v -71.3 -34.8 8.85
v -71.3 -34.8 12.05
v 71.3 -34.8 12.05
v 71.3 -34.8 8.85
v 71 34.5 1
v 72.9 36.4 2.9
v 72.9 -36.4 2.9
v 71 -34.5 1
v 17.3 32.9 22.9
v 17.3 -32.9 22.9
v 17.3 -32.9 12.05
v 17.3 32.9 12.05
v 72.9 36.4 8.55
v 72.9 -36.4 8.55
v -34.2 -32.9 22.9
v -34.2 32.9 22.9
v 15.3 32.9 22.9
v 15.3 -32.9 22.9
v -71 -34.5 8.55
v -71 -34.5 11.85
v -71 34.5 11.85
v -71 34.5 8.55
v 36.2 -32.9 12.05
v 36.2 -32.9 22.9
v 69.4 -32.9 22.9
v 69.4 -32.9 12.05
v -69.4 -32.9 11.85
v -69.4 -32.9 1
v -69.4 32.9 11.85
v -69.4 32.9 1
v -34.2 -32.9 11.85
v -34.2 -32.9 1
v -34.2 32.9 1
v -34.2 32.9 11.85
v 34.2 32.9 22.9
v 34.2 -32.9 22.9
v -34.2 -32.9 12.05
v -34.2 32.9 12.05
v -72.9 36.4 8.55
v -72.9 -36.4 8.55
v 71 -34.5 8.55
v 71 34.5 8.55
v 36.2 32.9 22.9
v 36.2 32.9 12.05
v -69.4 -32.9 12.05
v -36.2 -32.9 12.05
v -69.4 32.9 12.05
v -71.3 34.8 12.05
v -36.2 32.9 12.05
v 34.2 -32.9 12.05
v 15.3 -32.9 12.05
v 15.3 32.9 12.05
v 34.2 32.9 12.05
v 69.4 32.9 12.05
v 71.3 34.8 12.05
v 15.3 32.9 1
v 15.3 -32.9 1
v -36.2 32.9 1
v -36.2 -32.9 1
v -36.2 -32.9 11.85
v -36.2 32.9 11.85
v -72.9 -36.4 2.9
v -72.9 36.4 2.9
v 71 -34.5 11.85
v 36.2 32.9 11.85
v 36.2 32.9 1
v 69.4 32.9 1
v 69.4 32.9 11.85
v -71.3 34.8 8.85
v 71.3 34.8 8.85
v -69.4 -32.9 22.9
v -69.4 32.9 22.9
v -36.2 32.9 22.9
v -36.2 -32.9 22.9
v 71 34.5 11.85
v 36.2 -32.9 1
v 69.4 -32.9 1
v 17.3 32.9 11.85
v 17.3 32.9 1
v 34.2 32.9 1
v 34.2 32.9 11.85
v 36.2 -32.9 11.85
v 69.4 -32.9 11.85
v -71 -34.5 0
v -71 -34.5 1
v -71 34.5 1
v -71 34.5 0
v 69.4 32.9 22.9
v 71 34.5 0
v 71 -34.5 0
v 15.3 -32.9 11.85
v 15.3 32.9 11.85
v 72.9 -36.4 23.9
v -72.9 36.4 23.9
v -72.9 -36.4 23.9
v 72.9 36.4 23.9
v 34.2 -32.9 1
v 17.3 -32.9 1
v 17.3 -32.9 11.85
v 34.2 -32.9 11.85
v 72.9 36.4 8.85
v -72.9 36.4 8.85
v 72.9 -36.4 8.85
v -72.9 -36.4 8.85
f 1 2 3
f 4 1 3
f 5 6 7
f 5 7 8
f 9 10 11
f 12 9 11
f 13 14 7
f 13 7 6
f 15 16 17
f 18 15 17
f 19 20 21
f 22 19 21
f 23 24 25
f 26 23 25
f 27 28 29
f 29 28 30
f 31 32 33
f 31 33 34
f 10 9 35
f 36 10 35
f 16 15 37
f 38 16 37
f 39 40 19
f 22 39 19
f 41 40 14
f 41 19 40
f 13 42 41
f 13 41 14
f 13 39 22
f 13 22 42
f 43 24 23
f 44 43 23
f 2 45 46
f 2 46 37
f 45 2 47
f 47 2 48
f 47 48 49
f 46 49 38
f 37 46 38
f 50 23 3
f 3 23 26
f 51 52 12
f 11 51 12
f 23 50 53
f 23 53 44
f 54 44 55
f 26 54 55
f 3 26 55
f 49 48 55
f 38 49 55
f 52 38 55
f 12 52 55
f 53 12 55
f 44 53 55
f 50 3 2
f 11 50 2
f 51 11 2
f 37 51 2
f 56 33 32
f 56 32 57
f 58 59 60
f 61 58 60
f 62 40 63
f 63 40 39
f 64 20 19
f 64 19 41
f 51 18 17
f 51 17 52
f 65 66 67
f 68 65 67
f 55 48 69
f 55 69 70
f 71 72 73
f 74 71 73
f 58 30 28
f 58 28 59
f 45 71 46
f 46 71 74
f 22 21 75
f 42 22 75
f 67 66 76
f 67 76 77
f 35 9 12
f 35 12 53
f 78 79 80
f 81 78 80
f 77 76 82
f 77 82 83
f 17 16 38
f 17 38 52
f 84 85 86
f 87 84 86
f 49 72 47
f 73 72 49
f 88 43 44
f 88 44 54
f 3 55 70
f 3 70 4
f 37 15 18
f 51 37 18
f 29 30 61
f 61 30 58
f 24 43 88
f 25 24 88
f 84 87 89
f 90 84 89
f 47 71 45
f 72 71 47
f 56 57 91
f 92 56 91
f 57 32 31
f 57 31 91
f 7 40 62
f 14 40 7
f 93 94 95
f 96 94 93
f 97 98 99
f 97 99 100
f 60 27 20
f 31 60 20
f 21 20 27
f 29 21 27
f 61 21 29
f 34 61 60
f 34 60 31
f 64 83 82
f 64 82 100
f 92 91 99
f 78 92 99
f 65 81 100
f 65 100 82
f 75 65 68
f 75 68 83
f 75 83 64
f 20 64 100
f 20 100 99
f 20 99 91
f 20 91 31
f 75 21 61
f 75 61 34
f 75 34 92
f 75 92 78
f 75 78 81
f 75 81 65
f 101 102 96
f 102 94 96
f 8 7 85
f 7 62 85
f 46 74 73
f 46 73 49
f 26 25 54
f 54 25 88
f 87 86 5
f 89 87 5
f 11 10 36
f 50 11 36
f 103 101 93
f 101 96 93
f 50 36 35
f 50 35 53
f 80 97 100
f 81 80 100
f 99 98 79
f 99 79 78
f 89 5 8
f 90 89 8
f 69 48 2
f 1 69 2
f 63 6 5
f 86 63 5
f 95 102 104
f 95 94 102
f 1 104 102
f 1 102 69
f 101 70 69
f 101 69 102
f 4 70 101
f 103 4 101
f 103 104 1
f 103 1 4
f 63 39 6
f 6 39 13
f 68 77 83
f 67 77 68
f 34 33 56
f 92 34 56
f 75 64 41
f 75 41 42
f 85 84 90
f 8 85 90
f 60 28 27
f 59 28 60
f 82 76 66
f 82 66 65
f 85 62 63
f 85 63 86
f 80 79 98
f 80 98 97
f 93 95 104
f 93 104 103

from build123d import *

# Parameters (mm, degrees)
F4_W          = 145.8
F4_H          = 72.8
F5_DEPTH      = 1
F6_W          = 145.8
F6_H          = 72.8
F6_W_2        = 138.8
F6_H_2        = 65.8
F7_DEPTH      = 10.85
F8_W          = 2
F8_H          = 10.85
F9_DEPTH      = 65.8
F12_W         = 145.8
F12_H         = 72.8
F12_W_2       = 142
F12_H_2       = 69
F13_DEPTH     = 3.3
F14_W         = 145.8
F14_H         = 72.8
F14_W_2       = 142
F14_H_2       = 69
F15_DEPTH     = 3
F16_T4_DEPTH  = 142
F16_T9_DEPTH  = 69
F16_T14_DEPTH = 142
F16_T19_DEPTH = 69
F16_T25_DEPTH = 147.1433659759
F16_T31_DEPTH = 74.1433659759
F16_T40_DEPTH = 147.1433659759
F16_T46_DEPTH = 74.1433659759
F16_T55_DEPTH = 147.1433659759
F16_T61_DEPTH = 74.1433659759
F16_T70_DEPTH = 74.1433659759
F16_T76_DEPTH = 147.1433659759
F17_W         = 145.8
F17_H         = 72.8
F17_W_2       = 142.6
F17_H_2       = 69.6
F18_DEPTH     = 3.2


# Not quite as in the source:
# - a fillet or chamfer that OpenCascade refuses, or shapes differently, is made with other operations: its cross-section is extruded or revolved along the edge and cut away or added


with BuildPart() as f5:
    # F4 (on Top) → F5 (new body)
    with BuildSketch(Plane.XY):
        Rectangle(F4_W, F4_H)
    extrude(amount=F5_DEPTH)

    # F6 (on face) → F7 (join)
    with BuildSketch(Plane.XY.offset(1)):
        Rectangle(F6_W, F6_H)
        Rectangle(F6_W_2, F6_H_2, mode=Mode.SUBTRACT)
    extrude(amount=F7_DEPTH)

    # F8 (on face) → F9 (join, through all)
    with BuildSketch(Plane.XZ.offset(-32.9)):
        with Locations((-35.2, 6.425)):
            Rectangle(F8_W, F8_H)
        with Locations((16.3, 6.425)):
            Rectangle(F8_W, F8_H)
        with Locations((35.2, 6.425)):
            Rectangle(F8_W, F8_H)
    extrude(amount=F9_DEPTH)


with BuildPart() as f11_1:
    # F11: instance of F5
    add(f5.part.mirror(Plane(origin=(1.1434328358, 0, 11.95), x_dir=(1, 0, 0), z_dir=(0, 0, 1))))

    # F17 (on face) → F18 (join)
    with BuildSketch(Plane(origin=(0, 0, 12.05), x_dir=(1, 0, 0), z_dir=(0, 0, -1))):
        Rectangle(F17_W, F17_H)
        Rectangle(F17_W_2, F17_H_2, mode=Mode.SUBTRACT)
    extrude(amount=F18_DEPTH)


with BuildPart() as f5_1:
    add(f5.part)

    # F12 (on face) → F13 (cut)
    with BuildSketch(Plane.XY.offset(11.85)):
        Rectangle(F12_W, F12_H)
        Rectangle(F12_W_2, F12_H_2, mode=Mode.SUBTRACT)
    extrude(amount=-F13_DEPTH, mode=Mode.SUBTRACT)

    # F14 (on face) → F15 (cut)
    with BuildSketch(Plane(origin=(0, 0, 0), x_dir=(1, 0, 0), z_dir=(0, 0, -1))):
        Rectangle(F14_W, F14_H)
        Rectangle(F14_W_2, F14_H_2, mode=Mode.SUBTRACT)
    extrude(amount=-F15_DEPTH, mode=Mode.SUBTRACT)

    # F16: chamfer of 2 on 4 edges, made by hand


with BuildPart() as f16_tool2:
    # F16_s3 → F16_t4 (new body)
    with BuildSketch(Plane.YZ.offset(-71)):
        Polygon((-36.5, 3), (-34.5, 1), (-34.5, 3), align=None)
    extrude(amount=F16_T4_DEPTH)

    split(bisect_by=Plane.XZ.offset(36.4), keep=Keep.BOTTOM)


with BuildPart() as f5_2:
    add(f5_1.part)

    # F16_t1: union F16_tool2
    add(f16_tool2.part)


with BuildPart() as f16_tool7:
    # F16_s8 → F16_t9 (new body)
    with BuildSketch(Plane.XZ.offset(-34.5)):
        Polygon((-73, 3), (-71, 1), (-71, 3), align=None)
    extrude(amount=F16_T9_DEPTH)

    split(bisect_by=Plane.YZ.offset(-72.9), keep=Keep.TOP)


with BuildPart() as f5_3:
    add(f5_2.part)

    # F16_t6: union F16_tool7
    add(f16_tool7.part)


with BuildPart() as f16_tool12:
    # F16_s13 → F16_t14 (new body)
    with BuildSketch(Plane.YZ.offset(71)):
        Polygon((36.5, 3), (34.5, 1), (34.5, 3), align=None)
    extrude(amount=-F16_T14_DEPTH)

    split(bisect_by=Plane.XZ.offset(-36.4), keep=Keep.TOP)


with BuildPart() as f5_4:
    add(f5_3.part)

    # F16_t11: union F16_tool12
    add(f16_tool12.part)


with BuildPart() as f16_tool17:
    # F16_s18 → F16_t19 (new body)
    with BuildSketch(Plane.XZ.offset(34.5)):
        Polygon((73, 3), (71, 1), (71, 3), align=None)
    extrude(amount=-F16_T19_DEPTH)

    split(bisect_by=Plane.YZ.offset(72.9), keep=Keep.BOTTOM)


with BuildPart() as f5_5:
    add(f5_4.part)

    # F16_t16: union F16_tool17
    add(f16_tool17.part)


with BuildPart() as f16_tool23:
    # F16_s24 → F16_t25 (new body)
    with BuildSketch(Plane.YZ.offset(-76.1433659759)):
        Polygon((-36.5, 3), (-34.5, 1), (-34.5, 3), align=None)
    extrude(amount=F16_T25_DEPTH)

    split(bisect_by=Plane.XZ.offset(36.4), keep=Keep.BOTTOM)

    split(bisect_by=Plane.YZ.offset(-72.9), keep=Keep.TOP)

    split(bisect_by=Plane.YZ.offset(-71), keep=Keep.BOTTOM)


with BuildPart() as f16_tool29:
    # F16_s30 → F16_t31 (new body)
    with BuildSketch(Plane.XZ.offset(-34.5)):
        Polygon((-73, 3), (-71, 1), (-71, 3), align=None)
    extrude(amount=F16_T31_DEPTH)

    split(bisect_by=Plane.XZ.offset(36.4), keep=Keep.BOTTOM)

    split(bisect_by=Plane.YZ.offset(-72.9), keep=Keep.TOP)

    split(bisect_by=Plane.XZ.offset(34.5), keep=Keep.TOP)


with BuildPart() as f16_tool23_1:
    add(f16_tool23.part)

    # F16_t35: intersect F16_tool29
    add(f16_tool29.part, mode=Mode.INTERSECT)


with BuildPart() as f5_6:
    add(f5_5.part)

    # F16_t21: union F16_tool23
    add(f16_tool23_1.part)


with BuildPart() as f16_tool38:
    # F16_s39 → F16_t40 (new body)
    with BuildSketch(Plane.YZ.offset(-71)):
        Polygon((-36.5, 3), (-34.5, 1), (-34.5, 3), align=None)
    extrude(amount=F16_T40_DEPTH)

    split(bisect_by=Plane.XZ.offset(36.4), keep=Keep.BOTTOM)

    split(bisect_by=Plane.YZ.offset(72.9), keep=Keep.BOTTOM)

    split(bisect_by=Plane.YZ.offset(71), keep=Keep.TOP)


with BuildPart() as f16_tool44:
    # F16_s45 → F16_t46 (new body)
    with BuildSketch(Plane.XZ.offset(39.6433659759)):
        Polygon((73, 3), (71, 1), (71, 3), align=None)
    extrude(amount=-F16_T46_DEPTH)

    split(bisect_by=Plane.XZ.offset(36.4), keep=Keep.BOTTOM)

    split(bisect_by=Plane.YZ.offset(72.9), keep=Keep.BOTTOM)

    split(bisect_by=Plane.XZ.offset(34.5), keep=Keep.TOP)


with BuildPart() as f16_tool38_1:
    add(f16_tool38.part)

    # F16_t50: intersect F16_tool44
    add(f16_tool44.part, mode=Mode.INTERSECT)


with BuildPart() as f5_7:
    add(f5_6.part)

    # F16_t36: union F16_tool38
    add(f16_tool38_1.part)


with BuildPart() as f16_tool53:
    # F16_s54 → F16_t55 (new body)
    with BuildSketch(Plane.YZ.offset(71)):
        Polygon((36.5, 3), (34.5, 1), (34.5, 3), align=None)
    extrude(amount=-F16_T55_DEPTH)

    split(bisect_by=Plane.YZ.offset(-72.9), keep=Keep.TOP)

    split(bisect_by=Plane.XZ.offset(-36.4), keep=Keep.TOP)

    split(bisect_by=Plane.YZ.offset(-71), keep=Keep.BOTTOM)


with BuildPart() as f16_tool59:
    # F16_s60 → F16_t61 (new body)
    with BuildSketch(Plane.XZ.offset(-39.6433659759)):
        Polygon((-73, 3), (-71, 1), (-71, 3), align=None)
    extrude(amount=F16_T61_DEPTH)

    split(bisect_by=Plane.YZ.offset(-72.9), keep=Keep.TOP)

    split(bisect_by=Plane.XZ.offset(-36.4), keep=Keep.TOP)

    split(bisect_by=Plane.XZ.offset(-34.5), keep=Keep.BOTTOM)


with BuildPart() as f16_tool53_1:
    add(f16_tool53.part)

    # F16_t65: intersect F16_tool59
    add(f16_tool59.part, mode=Mode.INTERSECT)


with BuildPart() as f5_8:
    add(f5_7.part)

    # F16_t51: union F16_tool53
    add(f16_tool53_1.part)


with BuildPart() as f16_tool68:
    # F16_s69 → F16_t70 (new body)
    with BuildSketch(Plane.XZ.offset(34.5)):
        Polygon((73, 3), (71, 1), (71, 3), align=None)
    extrude(amount=-F16_T70_DEPTH)

    split(bisect_by=Plane.YZ.offset(72.9), keep=Keep.BOTTOM)

    split(bisect_by=Plane.XZ.offset(-36.4), keep=Keep.TOP)

    split(bisect_by=Plane.XZ.offset(-34.5), keep=Keep.BOTTOM)


with BuildPart() as f16_tool74:
    # F16_s75 → F16_t76 (new body)
    with BuildSketch(Plane.YZ.offset(76.1433659759)):
        Polygon((36.5, 3), (34.5, 1), (34.5, 3), align=None)
    extrude(amount=-F16_T76_DEPTH)

    split(bisect_by=Plane.YZ.offset(72.9), keep=Keep.BOTTOM)

    split(bisect_by=Plane.XZ.offset(-36.4), keep=Keep.TOP)

    split(bisect_by=Plane.YZ.offset(71), keep=Keep.TOP)


with BuildPart() as f16_tool68_1:
    add(f16_tool68.part)

    # F16_t80: intersect F16_tool74
    add(f16_tool74.part, mode=Mode.INTERSECT)


with BuildPart() as f5_9:
    add(f5_8.part)

    # F16_t66: union F16_tool68
    add(f16_tool68_1.part)


solid = Compound([f11_1.part, f5_9.part])
